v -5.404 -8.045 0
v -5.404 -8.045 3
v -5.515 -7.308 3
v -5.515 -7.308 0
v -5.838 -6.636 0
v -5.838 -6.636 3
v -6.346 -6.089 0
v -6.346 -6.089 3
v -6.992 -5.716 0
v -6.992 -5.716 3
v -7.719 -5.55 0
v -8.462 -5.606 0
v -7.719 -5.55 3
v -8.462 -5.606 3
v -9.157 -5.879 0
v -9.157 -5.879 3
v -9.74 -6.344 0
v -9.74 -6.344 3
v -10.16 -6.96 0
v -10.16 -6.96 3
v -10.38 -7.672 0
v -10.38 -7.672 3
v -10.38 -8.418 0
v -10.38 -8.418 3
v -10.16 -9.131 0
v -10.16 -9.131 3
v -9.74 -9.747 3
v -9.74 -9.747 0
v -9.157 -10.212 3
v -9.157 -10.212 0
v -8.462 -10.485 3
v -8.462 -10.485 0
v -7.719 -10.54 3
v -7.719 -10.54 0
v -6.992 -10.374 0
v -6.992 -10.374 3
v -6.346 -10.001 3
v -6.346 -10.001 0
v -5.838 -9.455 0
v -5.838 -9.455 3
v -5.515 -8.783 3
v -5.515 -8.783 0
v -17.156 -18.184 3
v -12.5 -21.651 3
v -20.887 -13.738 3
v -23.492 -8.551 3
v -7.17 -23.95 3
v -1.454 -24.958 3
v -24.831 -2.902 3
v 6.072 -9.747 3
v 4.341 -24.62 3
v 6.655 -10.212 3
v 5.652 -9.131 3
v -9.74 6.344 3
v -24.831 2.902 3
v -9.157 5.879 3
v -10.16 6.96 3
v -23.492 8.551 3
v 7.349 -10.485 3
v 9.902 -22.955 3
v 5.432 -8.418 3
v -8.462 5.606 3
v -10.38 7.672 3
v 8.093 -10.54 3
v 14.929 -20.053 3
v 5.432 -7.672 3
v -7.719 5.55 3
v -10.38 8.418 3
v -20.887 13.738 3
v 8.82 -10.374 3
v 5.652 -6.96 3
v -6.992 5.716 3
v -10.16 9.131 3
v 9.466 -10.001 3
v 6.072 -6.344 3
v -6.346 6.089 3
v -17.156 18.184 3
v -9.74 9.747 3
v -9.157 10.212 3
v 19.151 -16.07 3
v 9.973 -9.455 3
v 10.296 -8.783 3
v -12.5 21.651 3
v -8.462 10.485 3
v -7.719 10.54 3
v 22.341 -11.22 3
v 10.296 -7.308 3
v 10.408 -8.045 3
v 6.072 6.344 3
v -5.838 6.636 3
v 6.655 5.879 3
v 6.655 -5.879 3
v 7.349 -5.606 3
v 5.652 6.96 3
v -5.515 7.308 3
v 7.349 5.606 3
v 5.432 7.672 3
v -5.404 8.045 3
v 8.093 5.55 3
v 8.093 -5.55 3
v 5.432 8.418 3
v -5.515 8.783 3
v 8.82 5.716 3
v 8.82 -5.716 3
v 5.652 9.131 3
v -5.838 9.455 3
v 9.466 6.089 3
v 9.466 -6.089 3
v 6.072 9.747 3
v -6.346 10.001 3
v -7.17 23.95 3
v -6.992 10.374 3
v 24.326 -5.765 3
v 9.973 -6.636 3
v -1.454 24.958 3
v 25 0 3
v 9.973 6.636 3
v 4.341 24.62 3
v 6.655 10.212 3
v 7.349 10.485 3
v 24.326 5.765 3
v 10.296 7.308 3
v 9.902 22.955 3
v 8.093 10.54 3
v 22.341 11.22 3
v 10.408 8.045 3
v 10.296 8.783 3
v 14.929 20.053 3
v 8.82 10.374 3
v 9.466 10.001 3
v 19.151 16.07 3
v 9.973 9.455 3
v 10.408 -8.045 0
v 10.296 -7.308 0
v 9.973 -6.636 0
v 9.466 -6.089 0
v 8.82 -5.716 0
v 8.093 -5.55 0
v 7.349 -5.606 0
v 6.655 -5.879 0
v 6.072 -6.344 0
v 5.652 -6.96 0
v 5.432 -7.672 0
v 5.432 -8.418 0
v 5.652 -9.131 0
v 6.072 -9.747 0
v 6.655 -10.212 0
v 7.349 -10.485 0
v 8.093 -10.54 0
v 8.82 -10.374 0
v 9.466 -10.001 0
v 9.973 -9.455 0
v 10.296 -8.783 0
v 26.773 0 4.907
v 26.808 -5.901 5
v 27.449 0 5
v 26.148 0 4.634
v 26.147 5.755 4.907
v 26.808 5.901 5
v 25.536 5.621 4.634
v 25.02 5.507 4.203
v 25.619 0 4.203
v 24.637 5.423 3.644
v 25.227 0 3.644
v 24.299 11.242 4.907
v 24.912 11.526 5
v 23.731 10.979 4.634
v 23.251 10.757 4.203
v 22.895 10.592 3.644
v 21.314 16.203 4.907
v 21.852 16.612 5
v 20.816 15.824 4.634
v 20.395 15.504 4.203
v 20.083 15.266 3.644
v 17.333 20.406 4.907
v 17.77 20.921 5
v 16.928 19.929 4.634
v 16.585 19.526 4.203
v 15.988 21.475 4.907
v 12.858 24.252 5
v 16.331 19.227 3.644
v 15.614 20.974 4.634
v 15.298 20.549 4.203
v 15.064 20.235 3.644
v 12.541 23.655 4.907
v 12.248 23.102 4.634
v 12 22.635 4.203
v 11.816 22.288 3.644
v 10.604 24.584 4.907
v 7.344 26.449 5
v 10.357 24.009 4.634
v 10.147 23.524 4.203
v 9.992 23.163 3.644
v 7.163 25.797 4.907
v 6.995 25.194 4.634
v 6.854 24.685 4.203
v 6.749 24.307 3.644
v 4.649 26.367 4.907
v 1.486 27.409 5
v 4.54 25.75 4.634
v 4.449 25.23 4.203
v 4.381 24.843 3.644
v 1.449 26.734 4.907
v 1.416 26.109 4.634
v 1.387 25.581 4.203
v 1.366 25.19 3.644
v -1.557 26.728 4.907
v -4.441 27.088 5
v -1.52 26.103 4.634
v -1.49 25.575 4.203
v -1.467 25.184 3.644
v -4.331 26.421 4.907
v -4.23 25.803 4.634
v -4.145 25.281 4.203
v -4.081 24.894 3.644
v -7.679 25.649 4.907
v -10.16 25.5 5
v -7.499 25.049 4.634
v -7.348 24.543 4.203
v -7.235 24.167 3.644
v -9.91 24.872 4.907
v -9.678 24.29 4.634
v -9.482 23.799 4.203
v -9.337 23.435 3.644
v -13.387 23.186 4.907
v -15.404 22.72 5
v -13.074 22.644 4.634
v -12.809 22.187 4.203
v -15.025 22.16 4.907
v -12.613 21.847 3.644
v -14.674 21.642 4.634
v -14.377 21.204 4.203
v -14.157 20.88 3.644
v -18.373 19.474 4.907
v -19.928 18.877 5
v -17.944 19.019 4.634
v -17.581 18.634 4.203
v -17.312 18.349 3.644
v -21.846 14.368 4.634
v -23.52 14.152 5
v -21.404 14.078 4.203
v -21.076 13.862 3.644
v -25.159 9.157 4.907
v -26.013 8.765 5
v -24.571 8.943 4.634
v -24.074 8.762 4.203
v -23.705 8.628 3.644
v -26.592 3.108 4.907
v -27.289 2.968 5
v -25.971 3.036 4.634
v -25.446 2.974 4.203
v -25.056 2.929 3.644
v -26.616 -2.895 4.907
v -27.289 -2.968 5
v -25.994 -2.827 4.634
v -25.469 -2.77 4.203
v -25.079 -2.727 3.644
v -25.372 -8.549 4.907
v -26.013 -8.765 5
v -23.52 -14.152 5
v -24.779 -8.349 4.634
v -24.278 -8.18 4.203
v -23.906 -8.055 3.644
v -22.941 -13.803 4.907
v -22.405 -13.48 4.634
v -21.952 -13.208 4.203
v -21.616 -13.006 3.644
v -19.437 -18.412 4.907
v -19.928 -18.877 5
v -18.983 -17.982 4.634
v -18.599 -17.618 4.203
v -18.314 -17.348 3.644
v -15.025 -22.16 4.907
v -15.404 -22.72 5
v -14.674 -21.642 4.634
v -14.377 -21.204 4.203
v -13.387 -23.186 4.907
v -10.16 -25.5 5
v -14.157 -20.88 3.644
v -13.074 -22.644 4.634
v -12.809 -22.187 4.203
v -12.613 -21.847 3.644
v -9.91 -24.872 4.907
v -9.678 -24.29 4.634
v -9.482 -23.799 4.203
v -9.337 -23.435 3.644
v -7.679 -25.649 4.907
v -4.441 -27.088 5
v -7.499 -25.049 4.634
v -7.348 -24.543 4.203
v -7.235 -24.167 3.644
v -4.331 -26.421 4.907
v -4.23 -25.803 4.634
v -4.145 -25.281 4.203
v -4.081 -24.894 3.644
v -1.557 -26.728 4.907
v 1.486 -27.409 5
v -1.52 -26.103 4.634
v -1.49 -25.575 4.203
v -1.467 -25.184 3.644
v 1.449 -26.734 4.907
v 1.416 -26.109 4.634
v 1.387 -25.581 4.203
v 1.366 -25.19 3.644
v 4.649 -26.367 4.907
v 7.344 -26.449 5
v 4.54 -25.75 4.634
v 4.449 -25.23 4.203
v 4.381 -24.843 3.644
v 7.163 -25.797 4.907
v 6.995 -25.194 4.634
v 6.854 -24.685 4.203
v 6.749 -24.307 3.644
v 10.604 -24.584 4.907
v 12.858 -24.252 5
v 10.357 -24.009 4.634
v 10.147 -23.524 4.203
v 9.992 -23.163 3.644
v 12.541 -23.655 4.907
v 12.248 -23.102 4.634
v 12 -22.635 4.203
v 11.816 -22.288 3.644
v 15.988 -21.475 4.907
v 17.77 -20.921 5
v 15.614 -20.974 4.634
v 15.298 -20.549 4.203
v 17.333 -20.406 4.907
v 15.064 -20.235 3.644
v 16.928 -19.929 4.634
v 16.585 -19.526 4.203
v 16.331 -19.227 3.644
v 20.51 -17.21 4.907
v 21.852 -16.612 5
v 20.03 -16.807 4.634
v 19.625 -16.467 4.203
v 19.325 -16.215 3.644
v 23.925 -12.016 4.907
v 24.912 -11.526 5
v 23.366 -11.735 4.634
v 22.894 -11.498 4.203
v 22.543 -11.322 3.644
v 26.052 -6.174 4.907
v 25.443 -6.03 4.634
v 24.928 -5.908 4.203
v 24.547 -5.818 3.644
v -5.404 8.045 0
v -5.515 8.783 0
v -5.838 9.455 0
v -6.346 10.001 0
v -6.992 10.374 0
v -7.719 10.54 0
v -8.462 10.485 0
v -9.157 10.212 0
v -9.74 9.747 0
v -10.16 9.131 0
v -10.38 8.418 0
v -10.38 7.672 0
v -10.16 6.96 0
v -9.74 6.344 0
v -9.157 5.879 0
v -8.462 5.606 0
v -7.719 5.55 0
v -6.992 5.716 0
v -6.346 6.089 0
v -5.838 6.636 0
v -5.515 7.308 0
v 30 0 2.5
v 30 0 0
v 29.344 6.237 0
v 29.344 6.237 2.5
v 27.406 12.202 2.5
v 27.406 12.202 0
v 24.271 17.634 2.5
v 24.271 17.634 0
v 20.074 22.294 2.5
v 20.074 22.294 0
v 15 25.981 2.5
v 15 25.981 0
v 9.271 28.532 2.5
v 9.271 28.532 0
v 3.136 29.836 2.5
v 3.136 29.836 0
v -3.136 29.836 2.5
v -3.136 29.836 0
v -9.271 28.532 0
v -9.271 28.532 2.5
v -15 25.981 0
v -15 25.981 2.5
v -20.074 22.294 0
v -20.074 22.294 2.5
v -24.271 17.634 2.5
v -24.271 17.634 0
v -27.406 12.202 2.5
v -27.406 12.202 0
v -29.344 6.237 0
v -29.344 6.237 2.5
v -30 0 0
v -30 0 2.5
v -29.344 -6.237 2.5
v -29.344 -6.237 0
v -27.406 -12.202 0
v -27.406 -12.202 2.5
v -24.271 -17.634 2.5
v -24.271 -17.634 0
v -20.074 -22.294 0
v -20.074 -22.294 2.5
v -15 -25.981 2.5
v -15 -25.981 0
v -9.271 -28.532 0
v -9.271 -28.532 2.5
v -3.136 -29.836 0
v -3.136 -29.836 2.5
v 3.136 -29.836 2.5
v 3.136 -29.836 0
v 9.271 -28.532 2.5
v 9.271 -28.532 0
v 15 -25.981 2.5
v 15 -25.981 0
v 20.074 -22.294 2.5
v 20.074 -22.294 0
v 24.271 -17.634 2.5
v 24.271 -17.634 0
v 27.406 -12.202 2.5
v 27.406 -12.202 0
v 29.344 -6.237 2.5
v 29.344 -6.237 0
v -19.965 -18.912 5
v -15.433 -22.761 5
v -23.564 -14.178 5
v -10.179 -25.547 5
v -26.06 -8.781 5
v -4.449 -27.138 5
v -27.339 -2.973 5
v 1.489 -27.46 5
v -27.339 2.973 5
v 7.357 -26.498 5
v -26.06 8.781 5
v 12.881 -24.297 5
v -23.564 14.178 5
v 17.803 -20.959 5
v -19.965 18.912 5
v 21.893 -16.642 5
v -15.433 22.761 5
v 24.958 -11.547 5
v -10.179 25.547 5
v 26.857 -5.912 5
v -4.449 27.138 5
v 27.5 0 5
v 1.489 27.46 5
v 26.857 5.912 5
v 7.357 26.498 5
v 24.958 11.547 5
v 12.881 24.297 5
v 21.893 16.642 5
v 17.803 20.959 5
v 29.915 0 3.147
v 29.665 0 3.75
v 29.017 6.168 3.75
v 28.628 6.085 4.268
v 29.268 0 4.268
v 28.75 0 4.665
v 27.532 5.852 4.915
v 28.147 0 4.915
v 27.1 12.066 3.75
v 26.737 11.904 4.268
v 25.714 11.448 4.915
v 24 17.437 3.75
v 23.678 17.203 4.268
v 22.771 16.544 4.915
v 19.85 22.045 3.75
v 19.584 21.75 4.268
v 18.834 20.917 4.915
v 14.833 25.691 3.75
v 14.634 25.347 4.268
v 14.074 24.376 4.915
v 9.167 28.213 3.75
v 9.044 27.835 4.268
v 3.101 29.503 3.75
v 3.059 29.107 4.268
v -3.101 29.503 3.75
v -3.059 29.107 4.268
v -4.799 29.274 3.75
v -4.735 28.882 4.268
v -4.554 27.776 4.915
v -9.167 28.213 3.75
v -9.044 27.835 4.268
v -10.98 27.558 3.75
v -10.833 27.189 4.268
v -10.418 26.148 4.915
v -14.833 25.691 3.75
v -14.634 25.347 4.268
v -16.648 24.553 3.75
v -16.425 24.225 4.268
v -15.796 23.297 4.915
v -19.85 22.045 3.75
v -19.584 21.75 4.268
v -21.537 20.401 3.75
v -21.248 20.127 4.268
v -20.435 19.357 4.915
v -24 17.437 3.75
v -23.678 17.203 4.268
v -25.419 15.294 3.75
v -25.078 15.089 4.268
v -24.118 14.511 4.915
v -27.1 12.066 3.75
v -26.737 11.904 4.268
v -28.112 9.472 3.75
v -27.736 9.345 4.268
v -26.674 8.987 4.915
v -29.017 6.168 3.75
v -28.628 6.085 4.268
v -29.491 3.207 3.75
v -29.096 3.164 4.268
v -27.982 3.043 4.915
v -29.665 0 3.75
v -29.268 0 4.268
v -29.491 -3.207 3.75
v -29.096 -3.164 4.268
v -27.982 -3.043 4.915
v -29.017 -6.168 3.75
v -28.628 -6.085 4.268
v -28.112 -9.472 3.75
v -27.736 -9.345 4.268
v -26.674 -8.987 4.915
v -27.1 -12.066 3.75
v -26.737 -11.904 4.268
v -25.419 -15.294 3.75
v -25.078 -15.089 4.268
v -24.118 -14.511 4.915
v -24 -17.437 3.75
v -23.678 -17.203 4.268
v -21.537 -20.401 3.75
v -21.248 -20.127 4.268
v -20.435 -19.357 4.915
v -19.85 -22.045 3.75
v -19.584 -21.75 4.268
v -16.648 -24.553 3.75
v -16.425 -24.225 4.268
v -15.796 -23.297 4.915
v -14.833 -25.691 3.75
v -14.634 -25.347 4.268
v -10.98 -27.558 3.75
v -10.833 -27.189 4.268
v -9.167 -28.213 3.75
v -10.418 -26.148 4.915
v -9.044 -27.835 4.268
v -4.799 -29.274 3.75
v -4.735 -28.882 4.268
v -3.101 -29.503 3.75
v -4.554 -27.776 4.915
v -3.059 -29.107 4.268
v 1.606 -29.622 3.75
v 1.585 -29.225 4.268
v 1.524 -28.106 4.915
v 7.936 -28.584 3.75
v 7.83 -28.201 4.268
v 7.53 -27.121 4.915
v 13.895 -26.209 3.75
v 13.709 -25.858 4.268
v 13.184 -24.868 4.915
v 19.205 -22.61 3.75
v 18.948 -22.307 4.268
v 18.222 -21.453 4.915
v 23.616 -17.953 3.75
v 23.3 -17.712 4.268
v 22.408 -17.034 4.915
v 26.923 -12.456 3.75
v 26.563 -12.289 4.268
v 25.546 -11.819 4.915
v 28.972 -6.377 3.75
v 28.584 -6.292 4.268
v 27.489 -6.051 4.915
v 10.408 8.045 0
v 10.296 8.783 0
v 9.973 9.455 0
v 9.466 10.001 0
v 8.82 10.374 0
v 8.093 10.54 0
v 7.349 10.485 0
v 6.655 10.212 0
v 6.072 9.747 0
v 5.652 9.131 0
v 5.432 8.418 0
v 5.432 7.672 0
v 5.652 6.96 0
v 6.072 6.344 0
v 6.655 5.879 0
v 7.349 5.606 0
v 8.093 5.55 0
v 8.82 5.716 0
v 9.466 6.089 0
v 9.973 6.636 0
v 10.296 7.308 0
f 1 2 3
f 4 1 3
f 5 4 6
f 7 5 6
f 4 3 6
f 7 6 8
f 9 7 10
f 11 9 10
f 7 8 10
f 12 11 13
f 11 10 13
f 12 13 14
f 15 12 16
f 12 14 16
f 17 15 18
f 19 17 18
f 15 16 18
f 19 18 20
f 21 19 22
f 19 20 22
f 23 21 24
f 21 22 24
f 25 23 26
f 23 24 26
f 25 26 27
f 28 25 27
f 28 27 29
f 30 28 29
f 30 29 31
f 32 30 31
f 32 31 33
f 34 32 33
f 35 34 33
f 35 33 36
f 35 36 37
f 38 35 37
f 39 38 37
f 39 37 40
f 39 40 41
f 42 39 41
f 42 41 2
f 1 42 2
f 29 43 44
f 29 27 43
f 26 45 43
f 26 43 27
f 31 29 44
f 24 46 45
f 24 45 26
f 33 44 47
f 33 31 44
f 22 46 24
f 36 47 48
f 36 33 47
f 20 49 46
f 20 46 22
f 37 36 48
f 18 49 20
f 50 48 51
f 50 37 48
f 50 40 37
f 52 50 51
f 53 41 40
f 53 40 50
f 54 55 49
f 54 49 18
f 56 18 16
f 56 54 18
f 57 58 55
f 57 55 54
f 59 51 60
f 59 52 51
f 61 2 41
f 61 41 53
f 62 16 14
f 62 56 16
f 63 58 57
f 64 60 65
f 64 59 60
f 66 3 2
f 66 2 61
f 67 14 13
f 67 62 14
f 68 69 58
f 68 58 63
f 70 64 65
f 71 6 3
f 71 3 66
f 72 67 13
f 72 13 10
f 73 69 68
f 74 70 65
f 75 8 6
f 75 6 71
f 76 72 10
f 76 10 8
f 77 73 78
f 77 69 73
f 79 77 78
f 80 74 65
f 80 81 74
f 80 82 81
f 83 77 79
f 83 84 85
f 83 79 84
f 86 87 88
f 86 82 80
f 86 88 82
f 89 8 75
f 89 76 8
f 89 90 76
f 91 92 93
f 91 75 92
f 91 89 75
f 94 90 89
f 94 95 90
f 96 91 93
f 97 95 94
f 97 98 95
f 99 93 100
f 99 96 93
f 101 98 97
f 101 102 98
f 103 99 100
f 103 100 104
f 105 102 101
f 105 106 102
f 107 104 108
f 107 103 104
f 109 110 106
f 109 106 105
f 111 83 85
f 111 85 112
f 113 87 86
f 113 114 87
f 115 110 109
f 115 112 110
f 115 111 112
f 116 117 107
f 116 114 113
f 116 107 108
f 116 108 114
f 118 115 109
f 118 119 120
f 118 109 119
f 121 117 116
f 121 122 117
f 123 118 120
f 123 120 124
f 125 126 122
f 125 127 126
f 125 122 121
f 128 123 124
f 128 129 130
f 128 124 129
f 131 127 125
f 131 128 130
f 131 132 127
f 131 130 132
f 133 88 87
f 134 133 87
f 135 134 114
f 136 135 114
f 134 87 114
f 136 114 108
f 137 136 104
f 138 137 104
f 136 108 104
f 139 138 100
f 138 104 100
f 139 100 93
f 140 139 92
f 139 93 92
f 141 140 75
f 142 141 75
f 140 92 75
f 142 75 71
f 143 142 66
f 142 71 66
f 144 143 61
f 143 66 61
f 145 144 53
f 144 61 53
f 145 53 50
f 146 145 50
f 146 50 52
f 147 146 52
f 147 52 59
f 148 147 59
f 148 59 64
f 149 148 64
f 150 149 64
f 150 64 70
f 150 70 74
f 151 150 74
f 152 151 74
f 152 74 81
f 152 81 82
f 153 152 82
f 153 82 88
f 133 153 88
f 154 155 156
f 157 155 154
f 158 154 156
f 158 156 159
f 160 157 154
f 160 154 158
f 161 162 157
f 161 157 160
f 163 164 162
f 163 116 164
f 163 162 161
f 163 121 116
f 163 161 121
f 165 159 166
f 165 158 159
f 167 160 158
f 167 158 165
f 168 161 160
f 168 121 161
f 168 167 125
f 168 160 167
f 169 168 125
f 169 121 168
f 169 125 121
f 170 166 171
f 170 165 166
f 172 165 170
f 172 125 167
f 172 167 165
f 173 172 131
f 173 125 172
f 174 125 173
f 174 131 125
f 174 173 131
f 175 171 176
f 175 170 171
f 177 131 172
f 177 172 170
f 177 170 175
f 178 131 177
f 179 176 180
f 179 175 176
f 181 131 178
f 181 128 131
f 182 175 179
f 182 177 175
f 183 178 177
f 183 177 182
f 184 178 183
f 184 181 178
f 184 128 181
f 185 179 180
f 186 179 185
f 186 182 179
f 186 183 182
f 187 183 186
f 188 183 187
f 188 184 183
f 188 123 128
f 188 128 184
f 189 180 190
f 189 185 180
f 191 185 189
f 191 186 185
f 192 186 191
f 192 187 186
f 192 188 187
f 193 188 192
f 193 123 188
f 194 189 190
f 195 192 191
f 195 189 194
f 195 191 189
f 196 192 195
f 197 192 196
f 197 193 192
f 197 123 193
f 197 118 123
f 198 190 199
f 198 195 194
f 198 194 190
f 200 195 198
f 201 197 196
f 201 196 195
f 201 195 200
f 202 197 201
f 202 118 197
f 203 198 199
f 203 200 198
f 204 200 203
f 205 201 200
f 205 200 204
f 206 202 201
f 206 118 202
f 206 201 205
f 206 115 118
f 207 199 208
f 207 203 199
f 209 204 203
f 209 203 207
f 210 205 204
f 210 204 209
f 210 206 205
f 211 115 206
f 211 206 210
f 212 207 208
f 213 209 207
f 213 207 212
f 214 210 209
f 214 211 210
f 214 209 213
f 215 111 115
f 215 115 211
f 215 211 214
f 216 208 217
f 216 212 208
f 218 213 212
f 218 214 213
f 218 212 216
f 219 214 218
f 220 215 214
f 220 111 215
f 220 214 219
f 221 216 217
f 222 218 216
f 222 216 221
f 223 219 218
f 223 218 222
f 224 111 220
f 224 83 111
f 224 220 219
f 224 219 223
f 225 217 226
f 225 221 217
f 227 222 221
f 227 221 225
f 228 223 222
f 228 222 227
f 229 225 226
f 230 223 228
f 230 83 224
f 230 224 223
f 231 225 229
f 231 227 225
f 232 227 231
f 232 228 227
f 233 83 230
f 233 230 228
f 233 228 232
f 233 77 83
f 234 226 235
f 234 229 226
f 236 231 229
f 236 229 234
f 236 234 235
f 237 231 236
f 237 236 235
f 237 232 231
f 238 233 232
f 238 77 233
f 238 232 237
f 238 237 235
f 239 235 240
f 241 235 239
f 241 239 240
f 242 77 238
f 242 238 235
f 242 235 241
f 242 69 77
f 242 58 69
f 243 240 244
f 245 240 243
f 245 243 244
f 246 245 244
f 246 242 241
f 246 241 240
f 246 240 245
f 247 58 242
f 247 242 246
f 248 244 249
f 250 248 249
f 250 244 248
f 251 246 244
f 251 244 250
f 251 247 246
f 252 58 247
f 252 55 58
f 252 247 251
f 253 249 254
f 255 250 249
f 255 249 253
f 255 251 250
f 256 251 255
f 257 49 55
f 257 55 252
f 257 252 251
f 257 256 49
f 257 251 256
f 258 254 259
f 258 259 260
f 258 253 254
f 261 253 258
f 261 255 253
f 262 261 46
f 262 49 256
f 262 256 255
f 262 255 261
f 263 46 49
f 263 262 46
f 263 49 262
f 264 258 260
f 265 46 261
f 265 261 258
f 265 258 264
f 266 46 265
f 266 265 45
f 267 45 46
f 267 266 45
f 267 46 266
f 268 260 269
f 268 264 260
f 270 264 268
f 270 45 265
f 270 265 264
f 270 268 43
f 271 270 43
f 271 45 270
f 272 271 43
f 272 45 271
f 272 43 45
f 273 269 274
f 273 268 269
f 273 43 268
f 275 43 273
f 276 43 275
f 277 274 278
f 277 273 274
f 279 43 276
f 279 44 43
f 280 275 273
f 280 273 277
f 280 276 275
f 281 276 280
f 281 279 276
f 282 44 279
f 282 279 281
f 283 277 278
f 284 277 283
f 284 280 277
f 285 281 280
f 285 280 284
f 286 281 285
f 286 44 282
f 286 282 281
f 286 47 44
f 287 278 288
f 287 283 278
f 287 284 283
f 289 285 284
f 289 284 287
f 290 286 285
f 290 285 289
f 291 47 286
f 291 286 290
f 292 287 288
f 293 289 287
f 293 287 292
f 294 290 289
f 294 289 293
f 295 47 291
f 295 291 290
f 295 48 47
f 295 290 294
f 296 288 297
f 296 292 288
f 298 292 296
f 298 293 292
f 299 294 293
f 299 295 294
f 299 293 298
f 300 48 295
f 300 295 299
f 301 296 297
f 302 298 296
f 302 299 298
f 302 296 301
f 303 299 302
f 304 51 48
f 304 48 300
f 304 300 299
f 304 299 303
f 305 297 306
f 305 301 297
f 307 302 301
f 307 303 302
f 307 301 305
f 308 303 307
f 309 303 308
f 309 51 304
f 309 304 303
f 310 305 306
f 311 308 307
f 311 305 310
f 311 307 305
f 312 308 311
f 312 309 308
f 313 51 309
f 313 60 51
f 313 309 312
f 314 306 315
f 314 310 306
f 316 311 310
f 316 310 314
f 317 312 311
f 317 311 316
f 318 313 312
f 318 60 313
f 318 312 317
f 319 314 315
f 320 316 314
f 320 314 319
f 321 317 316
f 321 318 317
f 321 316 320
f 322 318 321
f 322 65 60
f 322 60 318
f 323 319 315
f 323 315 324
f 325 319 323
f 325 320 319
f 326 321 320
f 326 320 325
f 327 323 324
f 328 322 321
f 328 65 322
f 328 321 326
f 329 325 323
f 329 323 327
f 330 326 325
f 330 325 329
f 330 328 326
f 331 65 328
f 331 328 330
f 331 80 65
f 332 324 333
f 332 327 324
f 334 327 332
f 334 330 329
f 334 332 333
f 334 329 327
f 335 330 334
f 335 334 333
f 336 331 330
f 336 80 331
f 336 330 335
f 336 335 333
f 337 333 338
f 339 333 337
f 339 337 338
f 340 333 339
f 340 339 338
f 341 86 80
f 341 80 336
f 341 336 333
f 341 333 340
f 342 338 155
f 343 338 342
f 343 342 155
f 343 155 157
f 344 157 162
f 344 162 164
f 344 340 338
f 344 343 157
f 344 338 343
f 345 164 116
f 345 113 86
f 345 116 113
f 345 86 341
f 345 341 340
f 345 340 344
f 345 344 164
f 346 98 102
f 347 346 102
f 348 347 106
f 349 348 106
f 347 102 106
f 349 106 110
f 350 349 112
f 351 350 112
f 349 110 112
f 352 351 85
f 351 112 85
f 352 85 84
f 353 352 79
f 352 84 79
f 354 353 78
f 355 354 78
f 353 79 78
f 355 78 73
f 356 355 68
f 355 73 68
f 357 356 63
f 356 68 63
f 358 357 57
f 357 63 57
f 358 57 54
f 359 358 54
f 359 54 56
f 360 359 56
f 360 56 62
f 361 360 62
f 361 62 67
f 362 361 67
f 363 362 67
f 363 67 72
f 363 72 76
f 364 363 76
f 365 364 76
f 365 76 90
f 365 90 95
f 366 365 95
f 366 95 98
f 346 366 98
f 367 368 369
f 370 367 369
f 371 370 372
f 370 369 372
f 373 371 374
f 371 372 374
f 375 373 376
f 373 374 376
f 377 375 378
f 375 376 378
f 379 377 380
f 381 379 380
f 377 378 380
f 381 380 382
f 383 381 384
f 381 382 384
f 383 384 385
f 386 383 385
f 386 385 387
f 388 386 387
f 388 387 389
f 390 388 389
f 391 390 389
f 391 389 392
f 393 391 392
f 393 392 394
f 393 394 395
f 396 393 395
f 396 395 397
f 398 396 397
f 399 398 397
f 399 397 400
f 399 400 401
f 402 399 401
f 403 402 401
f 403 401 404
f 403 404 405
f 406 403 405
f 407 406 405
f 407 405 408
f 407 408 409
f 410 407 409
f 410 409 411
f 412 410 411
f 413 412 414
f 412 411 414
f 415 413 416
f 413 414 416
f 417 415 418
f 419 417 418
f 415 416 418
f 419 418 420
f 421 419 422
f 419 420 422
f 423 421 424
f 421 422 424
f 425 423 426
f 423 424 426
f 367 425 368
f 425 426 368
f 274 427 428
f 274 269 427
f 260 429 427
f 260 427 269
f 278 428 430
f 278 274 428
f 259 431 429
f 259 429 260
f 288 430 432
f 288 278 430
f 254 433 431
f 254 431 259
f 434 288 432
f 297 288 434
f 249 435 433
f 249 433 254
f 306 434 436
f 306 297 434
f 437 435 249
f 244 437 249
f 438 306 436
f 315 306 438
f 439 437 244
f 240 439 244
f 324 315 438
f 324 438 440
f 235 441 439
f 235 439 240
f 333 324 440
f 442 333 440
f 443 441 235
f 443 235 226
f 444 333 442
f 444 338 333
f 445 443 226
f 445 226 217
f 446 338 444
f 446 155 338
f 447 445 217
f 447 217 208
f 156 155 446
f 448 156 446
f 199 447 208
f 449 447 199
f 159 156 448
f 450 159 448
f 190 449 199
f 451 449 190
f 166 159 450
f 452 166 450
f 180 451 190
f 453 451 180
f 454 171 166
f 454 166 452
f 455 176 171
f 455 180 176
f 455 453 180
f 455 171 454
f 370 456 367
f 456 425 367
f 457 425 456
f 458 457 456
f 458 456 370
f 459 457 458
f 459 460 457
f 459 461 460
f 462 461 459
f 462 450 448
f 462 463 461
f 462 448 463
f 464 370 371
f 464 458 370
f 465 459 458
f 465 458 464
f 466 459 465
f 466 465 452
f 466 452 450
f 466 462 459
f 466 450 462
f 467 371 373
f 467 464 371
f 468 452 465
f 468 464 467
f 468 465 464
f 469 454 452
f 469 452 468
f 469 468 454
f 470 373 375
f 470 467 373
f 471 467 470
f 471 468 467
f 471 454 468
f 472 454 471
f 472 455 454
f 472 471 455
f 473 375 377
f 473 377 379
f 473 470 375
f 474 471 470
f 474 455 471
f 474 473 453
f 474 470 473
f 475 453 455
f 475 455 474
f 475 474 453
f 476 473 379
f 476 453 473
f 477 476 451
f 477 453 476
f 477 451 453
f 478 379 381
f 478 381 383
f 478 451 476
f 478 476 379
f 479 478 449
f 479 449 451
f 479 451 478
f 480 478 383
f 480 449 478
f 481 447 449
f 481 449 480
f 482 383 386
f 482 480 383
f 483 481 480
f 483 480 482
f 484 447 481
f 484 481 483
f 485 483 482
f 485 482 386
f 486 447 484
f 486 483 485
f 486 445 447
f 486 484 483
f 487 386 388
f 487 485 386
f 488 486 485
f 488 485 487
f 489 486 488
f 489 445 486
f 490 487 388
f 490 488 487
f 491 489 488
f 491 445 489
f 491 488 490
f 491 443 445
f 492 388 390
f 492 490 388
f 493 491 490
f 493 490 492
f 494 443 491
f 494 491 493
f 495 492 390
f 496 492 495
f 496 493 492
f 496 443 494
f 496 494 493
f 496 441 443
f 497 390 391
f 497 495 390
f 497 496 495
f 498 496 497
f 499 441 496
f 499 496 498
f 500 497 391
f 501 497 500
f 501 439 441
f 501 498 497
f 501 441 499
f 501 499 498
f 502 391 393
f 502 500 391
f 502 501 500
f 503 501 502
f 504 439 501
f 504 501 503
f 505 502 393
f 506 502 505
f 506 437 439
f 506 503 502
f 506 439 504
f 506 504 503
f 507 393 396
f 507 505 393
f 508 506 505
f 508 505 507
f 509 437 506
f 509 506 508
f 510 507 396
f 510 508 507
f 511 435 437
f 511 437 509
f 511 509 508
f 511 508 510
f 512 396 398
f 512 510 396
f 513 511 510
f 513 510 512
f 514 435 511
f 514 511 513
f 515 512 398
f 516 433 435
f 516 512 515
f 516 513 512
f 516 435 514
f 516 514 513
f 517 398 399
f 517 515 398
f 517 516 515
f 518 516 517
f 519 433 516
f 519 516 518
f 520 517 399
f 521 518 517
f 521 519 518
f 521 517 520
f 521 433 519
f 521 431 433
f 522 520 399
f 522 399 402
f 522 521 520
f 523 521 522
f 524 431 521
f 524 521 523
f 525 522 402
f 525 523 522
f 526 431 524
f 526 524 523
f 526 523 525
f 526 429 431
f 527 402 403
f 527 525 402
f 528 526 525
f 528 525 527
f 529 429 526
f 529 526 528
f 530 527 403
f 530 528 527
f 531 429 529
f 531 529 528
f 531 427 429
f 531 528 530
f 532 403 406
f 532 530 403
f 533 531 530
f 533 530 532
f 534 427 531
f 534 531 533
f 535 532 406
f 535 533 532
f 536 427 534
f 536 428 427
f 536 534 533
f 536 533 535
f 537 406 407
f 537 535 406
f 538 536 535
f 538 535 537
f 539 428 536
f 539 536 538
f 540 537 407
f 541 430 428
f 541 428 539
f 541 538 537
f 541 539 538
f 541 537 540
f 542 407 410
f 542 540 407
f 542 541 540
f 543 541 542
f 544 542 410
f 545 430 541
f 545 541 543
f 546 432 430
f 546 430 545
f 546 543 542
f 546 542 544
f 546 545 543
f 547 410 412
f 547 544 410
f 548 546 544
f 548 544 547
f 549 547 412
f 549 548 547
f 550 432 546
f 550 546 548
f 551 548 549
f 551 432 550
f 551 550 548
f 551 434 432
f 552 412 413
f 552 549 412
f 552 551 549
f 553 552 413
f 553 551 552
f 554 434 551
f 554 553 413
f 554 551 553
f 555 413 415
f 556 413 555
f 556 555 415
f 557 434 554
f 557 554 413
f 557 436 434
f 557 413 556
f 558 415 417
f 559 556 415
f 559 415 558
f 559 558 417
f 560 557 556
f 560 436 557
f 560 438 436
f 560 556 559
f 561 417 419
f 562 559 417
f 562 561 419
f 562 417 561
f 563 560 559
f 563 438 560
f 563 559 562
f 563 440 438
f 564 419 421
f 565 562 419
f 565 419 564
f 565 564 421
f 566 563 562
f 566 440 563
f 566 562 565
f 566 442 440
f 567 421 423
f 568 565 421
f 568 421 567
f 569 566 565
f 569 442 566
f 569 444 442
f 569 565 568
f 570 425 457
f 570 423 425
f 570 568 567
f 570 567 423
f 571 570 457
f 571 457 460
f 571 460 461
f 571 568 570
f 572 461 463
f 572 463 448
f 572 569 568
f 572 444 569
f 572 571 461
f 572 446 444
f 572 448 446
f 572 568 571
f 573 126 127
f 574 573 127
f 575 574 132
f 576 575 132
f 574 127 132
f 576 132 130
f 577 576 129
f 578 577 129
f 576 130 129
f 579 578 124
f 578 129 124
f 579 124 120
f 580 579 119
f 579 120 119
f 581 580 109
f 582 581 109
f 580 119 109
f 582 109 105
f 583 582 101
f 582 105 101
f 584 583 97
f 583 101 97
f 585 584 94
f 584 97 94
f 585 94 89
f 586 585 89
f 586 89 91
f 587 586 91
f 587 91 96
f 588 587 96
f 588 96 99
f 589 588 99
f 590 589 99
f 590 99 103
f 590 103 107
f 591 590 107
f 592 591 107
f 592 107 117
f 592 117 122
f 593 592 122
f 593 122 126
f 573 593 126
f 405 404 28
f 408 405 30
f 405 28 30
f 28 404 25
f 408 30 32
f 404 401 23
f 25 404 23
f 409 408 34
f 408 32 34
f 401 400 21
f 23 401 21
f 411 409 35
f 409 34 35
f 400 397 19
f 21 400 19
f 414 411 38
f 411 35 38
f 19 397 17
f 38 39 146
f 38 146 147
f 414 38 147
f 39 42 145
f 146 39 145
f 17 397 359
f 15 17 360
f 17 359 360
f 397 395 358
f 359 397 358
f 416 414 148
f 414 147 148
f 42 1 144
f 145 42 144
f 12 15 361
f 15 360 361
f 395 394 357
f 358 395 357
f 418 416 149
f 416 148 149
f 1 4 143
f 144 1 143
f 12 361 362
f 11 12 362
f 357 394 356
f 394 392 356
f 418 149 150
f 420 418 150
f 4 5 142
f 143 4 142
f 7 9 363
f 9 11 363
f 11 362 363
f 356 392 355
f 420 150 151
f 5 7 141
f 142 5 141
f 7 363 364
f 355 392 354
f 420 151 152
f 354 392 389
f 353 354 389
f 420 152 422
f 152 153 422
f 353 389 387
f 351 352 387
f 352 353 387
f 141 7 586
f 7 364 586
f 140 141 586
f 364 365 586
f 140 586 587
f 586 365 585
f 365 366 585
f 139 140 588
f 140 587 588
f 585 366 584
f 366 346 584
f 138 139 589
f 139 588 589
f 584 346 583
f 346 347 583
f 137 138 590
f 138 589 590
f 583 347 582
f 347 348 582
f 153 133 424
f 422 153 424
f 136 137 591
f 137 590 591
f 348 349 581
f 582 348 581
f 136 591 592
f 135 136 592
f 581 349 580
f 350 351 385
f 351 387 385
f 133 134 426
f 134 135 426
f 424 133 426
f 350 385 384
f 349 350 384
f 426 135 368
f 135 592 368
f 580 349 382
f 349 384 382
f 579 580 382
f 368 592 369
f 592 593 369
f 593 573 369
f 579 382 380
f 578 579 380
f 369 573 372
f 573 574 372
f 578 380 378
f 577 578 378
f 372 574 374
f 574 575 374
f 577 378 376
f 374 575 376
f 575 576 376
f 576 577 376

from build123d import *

# Parameters (mm, degrees)
F0_R     = 25
F1_DEPTH = 3
F0_R_2   = 30
F2_DEPTH = 5
F4_R     = 2.5019013152
F5_DEPTH = 25


# Not quite as in the source:
# - a fillet or chamfer that OpenCascade refuses, or shapes differently, is made with other operations: its cross-section is extruded or revolved along the edge and cut away or added


with BuildPart() as f1:
    # F0 (on Top) → F1 (new body)
    with BuildSketch(Plane.XY):
        Circle(F0_R)
    extrude(amount=F1_DEPTH)

    # F0 (on Top) → F2 (join)
    with BuildSketch(Plane.XY):
        Circle(F0_R_2)
        Circle(F0_R, mode=Mode.SUBTRACT)
    extrude(amount=F2_DEPTH)

    # F3: fillet of radius 2.5 on 2 edges, made by hand

    # F3_s1 → F3_t2 (revolve, cut)
    with BuildSketch(Plane.XZ):
        with BuildLine():
            ThreePointArc((30, 2.5), (29.267766953, 4.267766953), (27.5, 5))
            Line((27.5, 5), (30, 5))
            Line((30, 5), (30, 2.5))
        make_face()
    revolve(axis=Axis((0, 0, 5), (0, 0, 1)), mode=Mode.SUBTRACT)

    # F3_s3 → F3_t4 (revolve, cut)
    with BuildSketch(Plane.XZ):
        with BuildLine():
            ThreePointArc((27.4494897428, 5), (25.8683509127, 4.4364916731), (25, 3))
            Line((25, 3), (25, 5))
            Line((25, 5), (27.4494897428, 5))
        make_face()
    revolve(axis=Axis((0, 0, 5), (0, 0, 1)), mode=Mode.SUBTRACT)

    # F4 (on face) → F5 (cut)
    with BuildSketch(Plane.XY.offset(3)):
        with Locations((-7.9056667164, 8.0453660339)):
            Circle(F4_R)
        with Locations((7.9056667164, -8.0453660339)):
            Circle(F4_R)
        with Locations((7.9056667164, 8.0453660339)):
            Circle(F4_R)
        with Locations((-7.9056667164, -8.0453660339)):
            Circle(F4_R)
    extrude(amount=-F5_DEPTH, mode=Mode.SUBTRACT)


solid = f1.part
